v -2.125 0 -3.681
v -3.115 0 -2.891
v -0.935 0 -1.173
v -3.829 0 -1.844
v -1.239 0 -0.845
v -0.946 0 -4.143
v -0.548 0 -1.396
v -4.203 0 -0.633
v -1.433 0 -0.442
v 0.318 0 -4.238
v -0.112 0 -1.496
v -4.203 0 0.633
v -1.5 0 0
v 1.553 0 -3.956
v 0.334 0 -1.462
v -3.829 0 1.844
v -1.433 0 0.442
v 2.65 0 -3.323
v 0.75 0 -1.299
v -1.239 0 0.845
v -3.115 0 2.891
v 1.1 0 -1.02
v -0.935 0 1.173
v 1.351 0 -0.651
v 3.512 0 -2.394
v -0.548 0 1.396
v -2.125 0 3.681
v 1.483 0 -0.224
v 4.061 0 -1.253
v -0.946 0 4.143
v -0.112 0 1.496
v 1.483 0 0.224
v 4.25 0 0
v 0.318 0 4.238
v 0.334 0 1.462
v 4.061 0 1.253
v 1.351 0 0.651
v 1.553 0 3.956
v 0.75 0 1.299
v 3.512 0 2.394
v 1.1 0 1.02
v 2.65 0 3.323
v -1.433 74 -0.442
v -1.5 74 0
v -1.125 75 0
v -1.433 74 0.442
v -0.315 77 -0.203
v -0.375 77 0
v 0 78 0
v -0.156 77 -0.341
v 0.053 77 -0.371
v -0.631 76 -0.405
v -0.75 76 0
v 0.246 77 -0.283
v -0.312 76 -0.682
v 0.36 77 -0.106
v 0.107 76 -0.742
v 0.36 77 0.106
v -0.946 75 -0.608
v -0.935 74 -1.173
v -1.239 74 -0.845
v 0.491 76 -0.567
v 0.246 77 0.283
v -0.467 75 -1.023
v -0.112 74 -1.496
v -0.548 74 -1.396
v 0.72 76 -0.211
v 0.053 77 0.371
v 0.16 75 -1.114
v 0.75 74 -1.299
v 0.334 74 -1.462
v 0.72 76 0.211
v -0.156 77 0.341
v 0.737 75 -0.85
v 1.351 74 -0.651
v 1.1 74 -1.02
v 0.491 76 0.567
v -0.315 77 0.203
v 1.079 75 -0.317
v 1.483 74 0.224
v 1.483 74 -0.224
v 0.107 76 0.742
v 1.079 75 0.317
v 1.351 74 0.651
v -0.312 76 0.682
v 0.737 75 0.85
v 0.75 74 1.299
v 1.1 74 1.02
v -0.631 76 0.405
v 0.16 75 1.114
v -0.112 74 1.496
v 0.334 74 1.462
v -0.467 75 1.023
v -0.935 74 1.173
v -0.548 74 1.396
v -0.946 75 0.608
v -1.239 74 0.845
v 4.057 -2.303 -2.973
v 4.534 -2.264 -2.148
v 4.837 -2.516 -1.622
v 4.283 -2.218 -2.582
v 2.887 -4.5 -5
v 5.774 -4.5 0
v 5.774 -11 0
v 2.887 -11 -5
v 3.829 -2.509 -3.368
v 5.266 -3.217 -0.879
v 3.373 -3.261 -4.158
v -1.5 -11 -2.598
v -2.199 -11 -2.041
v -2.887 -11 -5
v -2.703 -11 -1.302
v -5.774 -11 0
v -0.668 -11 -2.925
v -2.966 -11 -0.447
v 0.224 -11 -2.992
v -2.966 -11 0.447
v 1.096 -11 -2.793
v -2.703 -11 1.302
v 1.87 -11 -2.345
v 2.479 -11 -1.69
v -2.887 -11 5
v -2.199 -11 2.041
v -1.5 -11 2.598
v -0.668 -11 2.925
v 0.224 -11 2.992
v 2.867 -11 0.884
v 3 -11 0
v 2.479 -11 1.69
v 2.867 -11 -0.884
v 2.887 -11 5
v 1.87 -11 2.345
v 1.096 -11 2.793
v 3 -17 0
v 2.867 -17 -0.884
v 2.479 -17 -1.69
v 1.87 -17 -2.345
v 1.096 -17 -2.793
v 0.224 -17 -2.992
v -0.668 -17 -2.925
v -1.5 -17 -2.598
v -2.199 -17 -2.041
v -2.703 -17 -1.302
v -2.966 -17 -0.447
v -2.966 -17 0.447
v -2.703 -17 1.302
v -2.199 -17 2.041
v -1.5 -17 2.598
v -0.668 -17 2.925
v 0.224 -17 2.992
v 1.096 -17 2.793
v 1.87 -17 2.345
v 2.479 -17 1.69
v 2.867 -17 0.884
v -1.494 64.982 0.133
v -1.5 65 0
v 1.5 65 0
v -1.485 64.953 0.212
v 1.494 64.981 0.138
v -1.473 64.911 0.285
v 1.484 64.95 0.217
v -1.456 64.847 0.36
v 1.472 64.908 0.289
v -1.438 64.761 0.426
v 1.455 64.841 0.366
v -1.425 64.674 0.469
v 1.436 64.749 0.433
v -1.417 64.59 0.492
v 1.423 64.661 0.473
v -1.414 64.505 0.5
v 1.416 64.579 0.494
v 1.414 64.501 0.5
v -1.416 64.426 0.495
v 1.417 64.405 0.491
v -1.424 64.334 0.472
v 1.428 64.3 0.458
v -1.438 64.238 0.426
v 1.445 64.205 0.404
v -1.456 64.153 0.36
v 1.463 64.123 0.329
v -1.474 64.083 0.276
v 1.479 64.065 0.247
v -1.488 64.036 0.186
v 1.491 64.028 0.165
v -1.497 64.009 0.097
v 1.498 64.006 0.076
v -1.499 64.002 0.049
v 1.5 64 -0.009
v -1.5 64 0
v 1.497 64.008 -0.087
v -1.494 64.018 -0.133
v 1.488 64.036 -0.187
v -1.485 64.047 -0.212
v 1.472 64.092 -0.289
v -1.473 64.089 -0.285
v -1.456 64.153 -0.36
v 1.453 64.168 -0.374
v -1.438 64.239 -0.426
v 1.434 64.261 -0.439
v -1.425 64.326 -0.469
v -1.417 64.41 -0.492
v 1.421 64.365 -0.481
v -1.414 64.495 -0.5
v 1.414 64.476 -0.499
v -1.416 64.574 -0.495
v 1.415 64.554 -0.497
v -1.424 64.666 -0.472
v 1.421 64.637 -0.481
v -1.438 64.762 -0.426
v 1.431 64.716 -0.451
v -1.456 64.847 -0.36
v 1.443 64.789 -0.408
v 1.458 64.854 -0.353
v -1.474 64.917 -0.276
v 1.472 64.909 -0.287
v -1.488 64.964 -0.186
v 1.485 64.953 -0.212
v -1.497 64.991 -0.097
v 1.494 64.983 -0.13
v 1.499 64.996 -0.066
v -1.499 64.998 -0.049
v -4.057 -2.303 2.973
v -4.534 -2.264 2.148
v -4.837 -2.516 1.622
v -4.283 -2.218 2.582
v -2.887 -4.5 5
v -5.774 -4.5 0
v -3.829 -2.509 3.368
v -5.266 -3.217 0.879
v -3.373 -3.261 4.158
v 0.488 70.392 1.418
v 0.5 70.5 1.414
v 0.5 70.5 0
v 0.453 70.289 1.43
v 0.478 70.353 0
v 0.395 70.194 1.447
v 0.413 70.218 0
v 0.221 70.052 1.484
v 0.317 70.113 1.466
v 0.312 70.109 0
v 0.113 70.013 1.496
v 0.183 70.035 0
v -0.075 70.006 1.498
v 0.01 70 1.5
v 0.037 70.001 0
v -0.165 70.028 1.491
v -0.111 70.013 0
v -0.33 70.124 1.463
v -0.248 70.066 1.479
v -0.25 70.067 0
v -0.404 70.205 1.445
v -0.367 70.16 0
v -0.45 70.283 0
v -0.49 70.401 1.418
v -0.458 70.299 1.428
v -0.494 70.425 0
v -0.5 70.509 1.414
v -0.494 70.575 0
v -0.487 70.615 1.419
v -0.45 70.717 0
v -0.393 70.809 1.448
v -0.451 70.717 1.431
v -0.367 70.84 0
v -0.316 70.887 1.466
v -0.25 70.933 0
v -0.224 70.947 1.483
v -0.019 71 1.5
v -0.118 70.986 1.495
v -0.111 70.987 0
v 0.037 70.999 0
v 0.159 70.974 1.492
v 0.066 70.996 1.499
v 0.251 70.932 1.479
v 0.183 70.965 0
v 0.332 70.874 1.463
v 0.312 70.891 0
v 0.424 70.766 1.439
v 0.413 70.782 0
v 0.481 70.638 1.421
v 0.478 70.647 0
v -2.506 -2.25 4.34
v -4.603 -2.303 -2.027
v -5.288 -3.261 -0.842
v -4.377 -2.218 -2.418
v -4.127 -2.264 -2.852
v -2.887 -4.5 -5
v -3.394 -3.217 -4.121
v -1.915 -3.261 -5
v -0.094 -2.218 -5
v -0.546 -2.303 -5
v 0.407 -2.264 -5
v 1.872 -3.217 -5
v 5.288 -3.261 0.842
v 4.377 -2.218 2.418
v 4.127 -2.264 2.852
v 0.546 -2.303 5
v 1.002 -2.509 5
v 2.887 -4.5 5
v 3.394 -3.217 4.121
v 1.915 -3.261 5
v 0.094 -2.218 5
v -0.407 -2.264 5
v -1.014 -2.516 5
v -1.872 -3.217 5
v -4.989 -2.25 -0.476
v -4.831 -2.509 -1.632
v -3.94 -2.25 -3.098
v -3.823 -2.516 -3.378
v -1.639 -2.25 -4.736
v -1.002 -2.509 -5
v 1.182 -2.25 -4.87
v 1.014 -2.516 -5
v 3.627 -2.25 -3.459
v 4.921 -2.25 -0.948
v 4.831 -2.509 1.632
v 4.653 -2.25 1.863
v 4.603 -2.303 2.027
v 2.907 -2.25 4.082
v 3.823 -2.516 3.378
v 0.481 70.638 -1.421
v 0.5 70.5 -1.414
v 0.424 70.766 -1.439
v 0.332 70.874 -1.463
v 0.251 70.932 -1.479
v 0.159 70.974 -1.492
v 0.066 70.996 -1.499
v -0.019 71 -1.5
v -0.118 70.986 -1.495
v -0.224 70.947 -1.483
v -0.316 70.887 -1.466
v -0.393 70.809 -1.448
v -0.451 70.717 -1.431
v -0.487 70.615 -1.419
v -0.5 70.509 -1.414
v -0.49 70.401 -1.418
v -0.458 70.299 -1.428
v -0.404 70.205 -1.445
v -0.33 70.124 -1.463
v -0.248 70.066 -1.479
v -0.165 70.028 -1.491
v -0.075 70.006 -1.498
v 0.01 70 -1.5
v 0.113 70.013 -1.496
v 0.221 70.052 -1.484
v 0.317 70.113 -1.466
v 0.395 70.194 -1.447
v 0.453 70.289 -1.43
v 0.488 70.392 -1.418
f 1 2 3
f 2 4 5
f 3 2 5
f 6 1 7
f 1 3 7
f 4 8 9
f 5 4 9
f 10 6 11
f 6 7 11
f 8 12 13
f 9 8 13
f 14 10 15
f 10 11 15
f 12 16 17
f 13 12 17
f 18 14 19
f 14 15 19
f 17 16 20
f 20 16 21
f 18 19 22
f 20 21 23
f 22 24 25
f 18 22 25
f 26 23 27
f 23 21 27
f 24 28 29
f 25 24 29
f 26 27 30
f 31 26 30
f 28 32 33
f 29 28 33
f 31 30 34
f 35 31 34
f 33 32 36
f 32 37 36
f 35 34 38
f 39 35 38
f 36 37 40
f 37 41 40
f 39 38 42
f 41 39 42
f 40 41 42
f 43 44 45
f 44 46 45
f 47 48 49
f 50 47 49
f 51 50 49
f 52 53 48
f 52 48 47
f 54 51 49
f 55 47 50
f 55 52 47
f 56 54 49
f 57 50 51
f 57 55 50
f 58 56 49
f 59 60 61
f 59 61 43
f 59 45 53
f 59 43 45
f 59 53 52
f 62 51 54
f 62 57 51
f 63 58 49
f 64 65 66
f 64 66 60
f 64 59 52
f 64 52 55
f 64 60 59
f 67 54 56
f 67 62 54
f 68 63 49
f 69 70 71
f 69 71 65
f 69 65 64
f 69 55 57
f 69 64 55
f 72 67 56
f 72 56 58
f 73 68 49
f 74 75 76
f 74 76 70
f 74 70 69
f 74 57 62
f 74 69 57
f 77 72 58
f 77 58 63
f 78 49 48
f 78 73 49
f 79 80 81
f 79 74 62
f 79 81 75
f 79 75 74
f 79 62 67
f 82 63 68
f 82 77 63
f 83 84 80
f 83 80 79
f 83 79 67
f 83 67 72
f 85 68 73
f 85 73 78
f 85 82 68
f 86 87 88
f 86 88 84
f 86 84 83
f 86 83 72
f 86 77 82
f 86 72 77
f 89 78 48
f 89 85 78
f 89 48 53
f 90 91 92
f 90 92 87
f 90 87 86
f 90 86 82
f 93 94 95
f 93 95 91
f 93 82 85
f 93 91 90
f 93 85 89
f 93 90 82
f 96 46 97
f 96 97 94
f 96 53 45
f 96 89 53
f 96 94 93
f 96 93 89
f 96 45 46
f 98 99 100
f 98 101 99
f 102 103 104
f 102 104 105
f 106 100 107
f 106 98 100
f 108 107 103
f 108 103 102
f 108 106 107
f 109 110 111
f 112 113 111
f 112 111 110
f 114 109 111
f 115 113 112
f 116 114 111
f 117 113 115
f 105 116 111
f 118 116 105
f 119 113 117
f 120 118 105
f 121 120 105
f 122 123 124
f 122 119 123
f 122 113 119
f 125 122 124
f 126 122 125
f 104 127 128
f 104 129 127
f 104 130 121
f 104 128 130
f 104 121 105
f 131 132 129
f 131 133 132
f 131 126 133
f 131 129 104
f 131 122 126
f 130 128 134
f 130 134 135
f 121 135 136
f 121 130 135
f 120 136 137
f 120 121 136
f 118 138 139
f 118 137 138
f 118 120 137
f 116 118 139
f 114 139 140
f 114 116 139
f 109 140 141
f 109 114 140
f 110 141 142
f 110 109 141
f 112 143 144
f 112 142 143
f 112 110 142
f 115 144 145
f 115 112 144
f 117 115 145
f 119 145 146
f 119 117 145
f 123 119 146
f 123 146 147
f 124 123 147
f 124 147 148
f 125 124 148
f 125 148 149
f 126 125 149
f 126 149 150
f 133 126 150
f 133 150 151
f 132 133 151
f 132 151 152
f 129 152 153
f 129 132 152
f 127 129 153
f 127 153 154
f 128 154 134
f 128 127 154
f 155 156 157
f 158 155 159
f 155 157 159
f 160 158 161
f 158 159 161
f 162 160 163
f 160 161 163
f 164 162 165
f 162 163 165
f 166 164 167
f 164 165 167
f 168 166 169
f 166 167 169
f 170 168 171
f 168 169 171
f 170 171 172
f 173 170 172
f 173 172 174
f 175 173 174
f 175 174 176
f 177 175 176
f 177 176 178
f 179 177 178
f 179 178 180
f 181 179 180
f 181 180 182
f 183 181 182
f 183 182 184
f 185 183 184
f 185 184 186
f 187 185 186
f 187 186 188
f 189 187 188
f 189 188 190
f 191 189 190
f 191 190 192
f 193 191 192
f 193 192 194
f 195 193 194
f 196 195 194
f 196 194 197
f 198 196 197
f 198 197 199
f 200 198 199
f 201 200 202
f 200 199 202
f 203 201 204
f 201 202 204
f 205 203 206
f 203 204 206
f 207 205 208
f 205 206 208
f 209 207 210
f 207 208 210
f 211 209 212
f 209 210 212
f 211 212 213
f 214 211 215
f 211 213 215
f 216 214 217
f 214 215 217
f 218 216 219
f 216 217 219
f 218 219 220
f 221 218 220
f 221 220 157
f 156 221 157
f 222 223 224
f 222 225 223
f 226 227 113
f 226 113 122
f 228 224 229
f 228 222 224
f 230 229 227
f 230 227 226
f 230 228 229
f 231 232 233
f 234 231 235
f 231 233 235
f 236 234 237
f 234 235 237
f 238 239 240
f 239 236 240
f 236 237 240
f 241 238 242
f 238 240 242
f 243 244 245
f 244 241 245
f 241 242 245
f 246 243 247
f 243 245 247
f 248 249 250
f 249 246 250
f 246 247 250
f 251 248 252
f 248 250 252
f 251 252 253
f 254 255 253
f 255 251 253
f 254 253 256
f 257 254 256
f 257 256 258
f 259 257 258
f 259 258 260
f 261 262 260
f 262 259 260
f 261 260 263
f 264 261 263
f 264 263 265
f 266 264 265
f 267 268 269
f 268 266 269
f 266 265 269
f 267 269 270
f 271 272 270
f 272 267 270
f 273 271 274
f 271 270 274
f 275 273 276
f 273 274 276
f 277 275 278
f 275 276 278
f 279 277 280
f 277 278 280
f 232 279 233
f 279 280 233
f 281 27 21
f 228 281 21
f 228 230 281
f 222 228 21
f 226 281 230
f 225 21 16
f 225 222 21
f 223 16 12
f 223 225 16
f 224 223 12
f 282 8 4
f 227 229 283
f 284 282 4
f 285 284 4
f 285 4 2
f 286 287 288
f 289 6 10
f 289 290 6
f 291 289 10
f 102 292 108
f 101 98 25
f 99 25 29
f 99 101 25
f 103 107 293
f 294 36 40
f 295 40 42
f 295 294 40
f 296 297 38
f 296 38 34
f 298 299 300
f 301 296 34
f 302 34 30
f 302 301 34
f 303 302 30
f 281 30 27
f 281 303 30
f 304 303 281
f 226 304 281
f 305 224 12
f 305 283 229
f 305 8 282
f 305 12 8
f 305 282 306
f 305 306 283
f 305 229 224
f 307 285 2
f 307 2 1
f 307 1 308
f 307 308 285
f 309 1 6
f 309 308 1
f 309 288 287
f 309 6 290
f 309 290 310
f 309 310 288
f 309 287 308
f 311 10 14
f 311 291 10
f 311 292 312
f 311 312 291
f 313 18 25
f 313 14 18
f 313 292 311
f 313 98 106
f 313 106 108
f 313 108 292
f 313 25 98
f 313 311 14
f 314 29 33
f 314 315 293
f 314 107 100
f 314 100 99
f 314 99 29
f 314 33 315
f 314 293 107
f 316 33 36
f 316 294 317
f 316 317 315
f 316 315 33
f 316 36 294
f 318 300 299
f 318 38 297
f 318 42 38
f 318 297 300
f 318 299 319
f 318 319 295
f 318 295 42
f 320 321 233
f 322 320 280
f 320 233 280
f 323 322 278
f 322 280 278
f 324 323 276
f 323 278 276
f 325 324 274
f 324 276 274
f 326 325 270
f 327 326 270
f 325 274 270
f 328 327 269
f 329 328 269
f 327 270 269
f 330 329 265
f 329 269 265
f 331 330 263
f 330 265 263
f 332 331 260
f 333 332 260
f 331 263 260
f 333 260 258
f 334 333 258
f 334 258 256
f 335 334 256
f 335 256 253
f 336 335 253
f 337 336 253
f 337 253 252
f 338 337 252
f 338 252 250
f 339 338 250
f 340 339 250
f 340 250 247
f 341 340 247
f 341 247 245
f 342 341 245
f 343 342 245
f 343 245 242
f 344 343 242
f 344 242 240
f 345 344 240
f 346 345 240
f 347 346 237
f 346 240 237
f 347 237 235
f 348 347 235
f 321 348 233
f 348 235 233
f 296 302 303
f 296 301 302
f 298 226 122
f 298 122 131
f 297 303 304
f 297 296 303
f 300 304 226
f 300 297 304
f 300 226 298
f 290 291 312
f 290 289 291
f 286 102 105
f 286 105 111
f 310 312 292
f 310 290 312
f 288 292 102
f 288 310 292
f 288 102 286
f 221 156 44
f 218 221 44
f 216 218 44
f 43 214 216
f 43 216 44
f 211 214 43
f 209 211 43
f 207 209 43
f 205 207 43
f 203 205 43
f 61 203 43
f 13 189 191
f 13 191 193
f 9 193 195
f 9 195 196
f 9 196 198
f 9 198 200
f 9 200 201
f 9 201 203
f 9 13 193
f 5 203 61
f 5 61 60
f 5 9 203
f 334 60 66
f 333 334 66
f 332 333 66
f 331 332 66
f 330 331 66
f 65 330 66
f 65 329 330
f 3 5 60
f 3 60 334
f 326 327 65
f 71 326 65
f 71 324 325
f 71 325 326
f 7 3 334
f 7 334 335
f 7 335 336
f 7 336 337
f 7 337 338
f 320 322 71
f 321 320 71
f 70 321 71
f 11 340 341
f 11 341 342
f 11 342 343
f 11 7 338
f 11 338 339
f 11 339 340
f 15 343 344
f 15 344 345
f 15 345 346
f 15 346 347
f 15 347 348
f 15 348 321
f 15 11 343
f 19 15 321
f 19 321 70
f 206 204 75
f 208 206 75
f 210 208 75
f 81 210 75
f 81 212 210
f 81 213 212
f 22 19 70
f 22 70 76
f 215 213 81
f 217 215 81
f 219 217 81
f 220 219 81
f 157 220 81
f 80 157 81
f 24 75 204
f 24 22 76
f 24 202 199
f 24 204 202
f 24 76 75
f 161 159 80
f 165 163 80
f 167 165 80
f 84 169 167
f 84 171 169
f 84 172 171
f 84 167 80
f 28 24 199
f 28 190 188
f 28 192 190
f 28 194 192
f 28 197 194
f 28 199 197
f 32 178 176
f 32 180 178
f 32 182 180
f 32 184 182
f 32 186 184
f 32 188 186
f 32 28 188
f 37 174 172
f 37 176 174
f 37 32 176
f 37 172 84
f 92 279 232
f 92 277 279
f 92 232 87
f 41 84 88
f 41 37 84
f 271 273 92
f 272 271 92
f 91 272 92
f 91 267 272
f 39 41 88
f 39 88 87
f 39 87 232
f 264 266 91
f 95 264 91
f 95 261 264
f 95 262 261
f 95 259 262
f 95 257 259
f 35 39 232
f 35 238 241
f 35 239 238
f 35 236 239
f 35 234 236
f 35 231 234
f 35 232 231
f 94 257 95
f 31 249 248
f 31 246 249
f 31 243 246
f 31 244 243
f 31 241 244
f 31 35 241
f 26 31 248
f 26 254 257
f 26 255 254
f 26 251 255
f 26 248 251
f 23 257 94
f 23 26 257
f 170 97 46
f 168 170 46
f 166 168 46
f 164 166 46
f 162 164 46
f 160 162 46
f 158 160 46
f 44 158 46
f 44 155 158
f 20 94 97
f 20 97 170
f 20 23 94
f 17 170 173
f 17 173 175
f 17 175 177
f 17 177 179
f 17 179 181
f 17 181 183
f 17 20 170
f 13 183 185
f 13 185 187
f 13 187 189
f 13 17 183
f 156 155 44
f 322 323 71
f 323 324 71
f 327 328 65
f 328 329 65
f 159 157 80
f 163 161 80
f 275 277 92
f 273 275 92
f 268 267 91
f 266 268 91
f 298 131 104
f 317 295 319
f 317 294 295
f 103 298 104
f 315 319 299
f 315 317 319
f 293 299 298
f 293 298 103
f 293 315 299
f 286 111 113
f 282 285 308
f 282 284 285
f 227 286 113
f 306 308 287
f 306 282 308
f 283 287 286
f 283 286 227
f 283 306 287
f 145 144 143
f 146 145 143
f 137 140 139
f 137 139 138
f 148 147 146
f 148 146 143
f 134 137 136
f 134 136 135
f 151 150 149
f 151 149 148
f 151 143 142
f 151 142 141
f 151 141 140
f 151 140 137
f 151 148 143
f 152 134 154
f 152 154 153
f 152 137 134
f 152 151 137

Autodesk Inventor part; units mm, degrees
ref_plane "YZ Plane" through (0, 0, 0) normal (1, 0, 0) x (0, 1, 0)
ref_plane "XZ Plane" through (0, 0, 0) normal (0, 1, 0) x (-1, 0, 0)
sketch "Sketch1" plane through (0, 0, 0) normal (0, 1, 0) x (-1, 0, 0)
  circle A0 centre (0, 0) radius 1.5
  dimension "d0" = 3
extrude "Extrusion1" add sketch "Sketch1" along normal blind 78
chamfer "Chamfer1" distance 1.5 distance2 4 1 edges at (1.5, 78, 0) measured on face at (-0.3743, 78, -0.3316)
sketch "Sketch2" plane through (0, 0, 0) normal (0, -1, 0) x (1, 0, 0)
  circle A0 centre (0, 0) radius 1.5 projected
  line L0 (2.8868, -5) -> (-2.8868, -5)
  line L1 (-2.8868, -5) -> (-5.7735, 0)
  line L2 (-5.7735, 0) -> (-2.8868, 5)
  line L3 (-2.8868, 5) -> (2.8868, 5)
  line L4 (2.8868, 5) -> (5.7735, 0)
  line L5 (5.7735, 0) -> (2.8868, -5)
  dimension "d6" = 10
extrude "Extrusion2" add sketch "Sketch2" along normal blind 11 contours A0 | L0 L1 L2 L3 L4 L5
sketch "Sketch3" plane through (0, -11, 0) normal (0, -1, 0) x (1, 0, 0)
  circle A0 centre (0, 0) radius 3
  dimension "d12" = 6
extrude "Extrusion3" add sketch "Sketch3" along normal blind 6
ref_plane "Work Plane1" through (0, -10, 0) normal (0.8660254, 0, 0.5) x (0, 1, 0)
sketch "Sketch5" plane through (0, -10, 0) normal (0.8660254, 0, 0.5) x (0, 1, 0)
  line L0 (10, 4.25) -> (5.5, 5.7735)
  line L1 (10, 5.7735) -> (10, 2.8868) construction
  line L2 (10, 5.7735) -> (-1, 5.7735) construction
  line L3 (-1, 2.8868) -> (-1, 5.7735) construction
  line L4 (10, 2.8868) -> (-1, 2.8868) construction
  line L5 (10, 4.25) -> (10, 5.7735)
  line L6 (5.5, 5.7735) -> (10, 5.7735)
  line L7 (-18.8, 0) -> (105.8, 0) projected
  point P0 (10, 0)
  dimension "d17" = 4.25
  dimension "d18" = 4.5
revolve "Revolution1" cut sketch "Sketch5" angle 360 about axis through (0, -10, 0) along (0, 1, 0)
sketch "Sketch7" plane through (0, 0, 0) normal (1, 0, 0) x (0, 1, 0)
  circle A0 centre (64.5, 0) radius 0.5
  line L0 (64.5, 0) -> (0, 0) construction
  dimension "d24" = 64.5
  dimension "d25" = 1
sketch "Sketch8" plane through (0, 0, 0) normal (0, 0, 1) x (1, 0, 0)
  circle A0 centre (0, 70.5) radius 0.5
  line L0 (0, 70.5) -> (0, 0) construction
  line L1 (-1.5, 0) -> (1.5, 0) construction
  dimension "d26" = 70.5
  dimension "d27" = 1
extrude "Extrusion5" cut sketch "Sketch8" along normal through all both and the other way through all
extrude "Extrusion6" cut sketch "Sketch7" along normal through all both and the other way through all
properties part number "CH_01_0003_injector"
